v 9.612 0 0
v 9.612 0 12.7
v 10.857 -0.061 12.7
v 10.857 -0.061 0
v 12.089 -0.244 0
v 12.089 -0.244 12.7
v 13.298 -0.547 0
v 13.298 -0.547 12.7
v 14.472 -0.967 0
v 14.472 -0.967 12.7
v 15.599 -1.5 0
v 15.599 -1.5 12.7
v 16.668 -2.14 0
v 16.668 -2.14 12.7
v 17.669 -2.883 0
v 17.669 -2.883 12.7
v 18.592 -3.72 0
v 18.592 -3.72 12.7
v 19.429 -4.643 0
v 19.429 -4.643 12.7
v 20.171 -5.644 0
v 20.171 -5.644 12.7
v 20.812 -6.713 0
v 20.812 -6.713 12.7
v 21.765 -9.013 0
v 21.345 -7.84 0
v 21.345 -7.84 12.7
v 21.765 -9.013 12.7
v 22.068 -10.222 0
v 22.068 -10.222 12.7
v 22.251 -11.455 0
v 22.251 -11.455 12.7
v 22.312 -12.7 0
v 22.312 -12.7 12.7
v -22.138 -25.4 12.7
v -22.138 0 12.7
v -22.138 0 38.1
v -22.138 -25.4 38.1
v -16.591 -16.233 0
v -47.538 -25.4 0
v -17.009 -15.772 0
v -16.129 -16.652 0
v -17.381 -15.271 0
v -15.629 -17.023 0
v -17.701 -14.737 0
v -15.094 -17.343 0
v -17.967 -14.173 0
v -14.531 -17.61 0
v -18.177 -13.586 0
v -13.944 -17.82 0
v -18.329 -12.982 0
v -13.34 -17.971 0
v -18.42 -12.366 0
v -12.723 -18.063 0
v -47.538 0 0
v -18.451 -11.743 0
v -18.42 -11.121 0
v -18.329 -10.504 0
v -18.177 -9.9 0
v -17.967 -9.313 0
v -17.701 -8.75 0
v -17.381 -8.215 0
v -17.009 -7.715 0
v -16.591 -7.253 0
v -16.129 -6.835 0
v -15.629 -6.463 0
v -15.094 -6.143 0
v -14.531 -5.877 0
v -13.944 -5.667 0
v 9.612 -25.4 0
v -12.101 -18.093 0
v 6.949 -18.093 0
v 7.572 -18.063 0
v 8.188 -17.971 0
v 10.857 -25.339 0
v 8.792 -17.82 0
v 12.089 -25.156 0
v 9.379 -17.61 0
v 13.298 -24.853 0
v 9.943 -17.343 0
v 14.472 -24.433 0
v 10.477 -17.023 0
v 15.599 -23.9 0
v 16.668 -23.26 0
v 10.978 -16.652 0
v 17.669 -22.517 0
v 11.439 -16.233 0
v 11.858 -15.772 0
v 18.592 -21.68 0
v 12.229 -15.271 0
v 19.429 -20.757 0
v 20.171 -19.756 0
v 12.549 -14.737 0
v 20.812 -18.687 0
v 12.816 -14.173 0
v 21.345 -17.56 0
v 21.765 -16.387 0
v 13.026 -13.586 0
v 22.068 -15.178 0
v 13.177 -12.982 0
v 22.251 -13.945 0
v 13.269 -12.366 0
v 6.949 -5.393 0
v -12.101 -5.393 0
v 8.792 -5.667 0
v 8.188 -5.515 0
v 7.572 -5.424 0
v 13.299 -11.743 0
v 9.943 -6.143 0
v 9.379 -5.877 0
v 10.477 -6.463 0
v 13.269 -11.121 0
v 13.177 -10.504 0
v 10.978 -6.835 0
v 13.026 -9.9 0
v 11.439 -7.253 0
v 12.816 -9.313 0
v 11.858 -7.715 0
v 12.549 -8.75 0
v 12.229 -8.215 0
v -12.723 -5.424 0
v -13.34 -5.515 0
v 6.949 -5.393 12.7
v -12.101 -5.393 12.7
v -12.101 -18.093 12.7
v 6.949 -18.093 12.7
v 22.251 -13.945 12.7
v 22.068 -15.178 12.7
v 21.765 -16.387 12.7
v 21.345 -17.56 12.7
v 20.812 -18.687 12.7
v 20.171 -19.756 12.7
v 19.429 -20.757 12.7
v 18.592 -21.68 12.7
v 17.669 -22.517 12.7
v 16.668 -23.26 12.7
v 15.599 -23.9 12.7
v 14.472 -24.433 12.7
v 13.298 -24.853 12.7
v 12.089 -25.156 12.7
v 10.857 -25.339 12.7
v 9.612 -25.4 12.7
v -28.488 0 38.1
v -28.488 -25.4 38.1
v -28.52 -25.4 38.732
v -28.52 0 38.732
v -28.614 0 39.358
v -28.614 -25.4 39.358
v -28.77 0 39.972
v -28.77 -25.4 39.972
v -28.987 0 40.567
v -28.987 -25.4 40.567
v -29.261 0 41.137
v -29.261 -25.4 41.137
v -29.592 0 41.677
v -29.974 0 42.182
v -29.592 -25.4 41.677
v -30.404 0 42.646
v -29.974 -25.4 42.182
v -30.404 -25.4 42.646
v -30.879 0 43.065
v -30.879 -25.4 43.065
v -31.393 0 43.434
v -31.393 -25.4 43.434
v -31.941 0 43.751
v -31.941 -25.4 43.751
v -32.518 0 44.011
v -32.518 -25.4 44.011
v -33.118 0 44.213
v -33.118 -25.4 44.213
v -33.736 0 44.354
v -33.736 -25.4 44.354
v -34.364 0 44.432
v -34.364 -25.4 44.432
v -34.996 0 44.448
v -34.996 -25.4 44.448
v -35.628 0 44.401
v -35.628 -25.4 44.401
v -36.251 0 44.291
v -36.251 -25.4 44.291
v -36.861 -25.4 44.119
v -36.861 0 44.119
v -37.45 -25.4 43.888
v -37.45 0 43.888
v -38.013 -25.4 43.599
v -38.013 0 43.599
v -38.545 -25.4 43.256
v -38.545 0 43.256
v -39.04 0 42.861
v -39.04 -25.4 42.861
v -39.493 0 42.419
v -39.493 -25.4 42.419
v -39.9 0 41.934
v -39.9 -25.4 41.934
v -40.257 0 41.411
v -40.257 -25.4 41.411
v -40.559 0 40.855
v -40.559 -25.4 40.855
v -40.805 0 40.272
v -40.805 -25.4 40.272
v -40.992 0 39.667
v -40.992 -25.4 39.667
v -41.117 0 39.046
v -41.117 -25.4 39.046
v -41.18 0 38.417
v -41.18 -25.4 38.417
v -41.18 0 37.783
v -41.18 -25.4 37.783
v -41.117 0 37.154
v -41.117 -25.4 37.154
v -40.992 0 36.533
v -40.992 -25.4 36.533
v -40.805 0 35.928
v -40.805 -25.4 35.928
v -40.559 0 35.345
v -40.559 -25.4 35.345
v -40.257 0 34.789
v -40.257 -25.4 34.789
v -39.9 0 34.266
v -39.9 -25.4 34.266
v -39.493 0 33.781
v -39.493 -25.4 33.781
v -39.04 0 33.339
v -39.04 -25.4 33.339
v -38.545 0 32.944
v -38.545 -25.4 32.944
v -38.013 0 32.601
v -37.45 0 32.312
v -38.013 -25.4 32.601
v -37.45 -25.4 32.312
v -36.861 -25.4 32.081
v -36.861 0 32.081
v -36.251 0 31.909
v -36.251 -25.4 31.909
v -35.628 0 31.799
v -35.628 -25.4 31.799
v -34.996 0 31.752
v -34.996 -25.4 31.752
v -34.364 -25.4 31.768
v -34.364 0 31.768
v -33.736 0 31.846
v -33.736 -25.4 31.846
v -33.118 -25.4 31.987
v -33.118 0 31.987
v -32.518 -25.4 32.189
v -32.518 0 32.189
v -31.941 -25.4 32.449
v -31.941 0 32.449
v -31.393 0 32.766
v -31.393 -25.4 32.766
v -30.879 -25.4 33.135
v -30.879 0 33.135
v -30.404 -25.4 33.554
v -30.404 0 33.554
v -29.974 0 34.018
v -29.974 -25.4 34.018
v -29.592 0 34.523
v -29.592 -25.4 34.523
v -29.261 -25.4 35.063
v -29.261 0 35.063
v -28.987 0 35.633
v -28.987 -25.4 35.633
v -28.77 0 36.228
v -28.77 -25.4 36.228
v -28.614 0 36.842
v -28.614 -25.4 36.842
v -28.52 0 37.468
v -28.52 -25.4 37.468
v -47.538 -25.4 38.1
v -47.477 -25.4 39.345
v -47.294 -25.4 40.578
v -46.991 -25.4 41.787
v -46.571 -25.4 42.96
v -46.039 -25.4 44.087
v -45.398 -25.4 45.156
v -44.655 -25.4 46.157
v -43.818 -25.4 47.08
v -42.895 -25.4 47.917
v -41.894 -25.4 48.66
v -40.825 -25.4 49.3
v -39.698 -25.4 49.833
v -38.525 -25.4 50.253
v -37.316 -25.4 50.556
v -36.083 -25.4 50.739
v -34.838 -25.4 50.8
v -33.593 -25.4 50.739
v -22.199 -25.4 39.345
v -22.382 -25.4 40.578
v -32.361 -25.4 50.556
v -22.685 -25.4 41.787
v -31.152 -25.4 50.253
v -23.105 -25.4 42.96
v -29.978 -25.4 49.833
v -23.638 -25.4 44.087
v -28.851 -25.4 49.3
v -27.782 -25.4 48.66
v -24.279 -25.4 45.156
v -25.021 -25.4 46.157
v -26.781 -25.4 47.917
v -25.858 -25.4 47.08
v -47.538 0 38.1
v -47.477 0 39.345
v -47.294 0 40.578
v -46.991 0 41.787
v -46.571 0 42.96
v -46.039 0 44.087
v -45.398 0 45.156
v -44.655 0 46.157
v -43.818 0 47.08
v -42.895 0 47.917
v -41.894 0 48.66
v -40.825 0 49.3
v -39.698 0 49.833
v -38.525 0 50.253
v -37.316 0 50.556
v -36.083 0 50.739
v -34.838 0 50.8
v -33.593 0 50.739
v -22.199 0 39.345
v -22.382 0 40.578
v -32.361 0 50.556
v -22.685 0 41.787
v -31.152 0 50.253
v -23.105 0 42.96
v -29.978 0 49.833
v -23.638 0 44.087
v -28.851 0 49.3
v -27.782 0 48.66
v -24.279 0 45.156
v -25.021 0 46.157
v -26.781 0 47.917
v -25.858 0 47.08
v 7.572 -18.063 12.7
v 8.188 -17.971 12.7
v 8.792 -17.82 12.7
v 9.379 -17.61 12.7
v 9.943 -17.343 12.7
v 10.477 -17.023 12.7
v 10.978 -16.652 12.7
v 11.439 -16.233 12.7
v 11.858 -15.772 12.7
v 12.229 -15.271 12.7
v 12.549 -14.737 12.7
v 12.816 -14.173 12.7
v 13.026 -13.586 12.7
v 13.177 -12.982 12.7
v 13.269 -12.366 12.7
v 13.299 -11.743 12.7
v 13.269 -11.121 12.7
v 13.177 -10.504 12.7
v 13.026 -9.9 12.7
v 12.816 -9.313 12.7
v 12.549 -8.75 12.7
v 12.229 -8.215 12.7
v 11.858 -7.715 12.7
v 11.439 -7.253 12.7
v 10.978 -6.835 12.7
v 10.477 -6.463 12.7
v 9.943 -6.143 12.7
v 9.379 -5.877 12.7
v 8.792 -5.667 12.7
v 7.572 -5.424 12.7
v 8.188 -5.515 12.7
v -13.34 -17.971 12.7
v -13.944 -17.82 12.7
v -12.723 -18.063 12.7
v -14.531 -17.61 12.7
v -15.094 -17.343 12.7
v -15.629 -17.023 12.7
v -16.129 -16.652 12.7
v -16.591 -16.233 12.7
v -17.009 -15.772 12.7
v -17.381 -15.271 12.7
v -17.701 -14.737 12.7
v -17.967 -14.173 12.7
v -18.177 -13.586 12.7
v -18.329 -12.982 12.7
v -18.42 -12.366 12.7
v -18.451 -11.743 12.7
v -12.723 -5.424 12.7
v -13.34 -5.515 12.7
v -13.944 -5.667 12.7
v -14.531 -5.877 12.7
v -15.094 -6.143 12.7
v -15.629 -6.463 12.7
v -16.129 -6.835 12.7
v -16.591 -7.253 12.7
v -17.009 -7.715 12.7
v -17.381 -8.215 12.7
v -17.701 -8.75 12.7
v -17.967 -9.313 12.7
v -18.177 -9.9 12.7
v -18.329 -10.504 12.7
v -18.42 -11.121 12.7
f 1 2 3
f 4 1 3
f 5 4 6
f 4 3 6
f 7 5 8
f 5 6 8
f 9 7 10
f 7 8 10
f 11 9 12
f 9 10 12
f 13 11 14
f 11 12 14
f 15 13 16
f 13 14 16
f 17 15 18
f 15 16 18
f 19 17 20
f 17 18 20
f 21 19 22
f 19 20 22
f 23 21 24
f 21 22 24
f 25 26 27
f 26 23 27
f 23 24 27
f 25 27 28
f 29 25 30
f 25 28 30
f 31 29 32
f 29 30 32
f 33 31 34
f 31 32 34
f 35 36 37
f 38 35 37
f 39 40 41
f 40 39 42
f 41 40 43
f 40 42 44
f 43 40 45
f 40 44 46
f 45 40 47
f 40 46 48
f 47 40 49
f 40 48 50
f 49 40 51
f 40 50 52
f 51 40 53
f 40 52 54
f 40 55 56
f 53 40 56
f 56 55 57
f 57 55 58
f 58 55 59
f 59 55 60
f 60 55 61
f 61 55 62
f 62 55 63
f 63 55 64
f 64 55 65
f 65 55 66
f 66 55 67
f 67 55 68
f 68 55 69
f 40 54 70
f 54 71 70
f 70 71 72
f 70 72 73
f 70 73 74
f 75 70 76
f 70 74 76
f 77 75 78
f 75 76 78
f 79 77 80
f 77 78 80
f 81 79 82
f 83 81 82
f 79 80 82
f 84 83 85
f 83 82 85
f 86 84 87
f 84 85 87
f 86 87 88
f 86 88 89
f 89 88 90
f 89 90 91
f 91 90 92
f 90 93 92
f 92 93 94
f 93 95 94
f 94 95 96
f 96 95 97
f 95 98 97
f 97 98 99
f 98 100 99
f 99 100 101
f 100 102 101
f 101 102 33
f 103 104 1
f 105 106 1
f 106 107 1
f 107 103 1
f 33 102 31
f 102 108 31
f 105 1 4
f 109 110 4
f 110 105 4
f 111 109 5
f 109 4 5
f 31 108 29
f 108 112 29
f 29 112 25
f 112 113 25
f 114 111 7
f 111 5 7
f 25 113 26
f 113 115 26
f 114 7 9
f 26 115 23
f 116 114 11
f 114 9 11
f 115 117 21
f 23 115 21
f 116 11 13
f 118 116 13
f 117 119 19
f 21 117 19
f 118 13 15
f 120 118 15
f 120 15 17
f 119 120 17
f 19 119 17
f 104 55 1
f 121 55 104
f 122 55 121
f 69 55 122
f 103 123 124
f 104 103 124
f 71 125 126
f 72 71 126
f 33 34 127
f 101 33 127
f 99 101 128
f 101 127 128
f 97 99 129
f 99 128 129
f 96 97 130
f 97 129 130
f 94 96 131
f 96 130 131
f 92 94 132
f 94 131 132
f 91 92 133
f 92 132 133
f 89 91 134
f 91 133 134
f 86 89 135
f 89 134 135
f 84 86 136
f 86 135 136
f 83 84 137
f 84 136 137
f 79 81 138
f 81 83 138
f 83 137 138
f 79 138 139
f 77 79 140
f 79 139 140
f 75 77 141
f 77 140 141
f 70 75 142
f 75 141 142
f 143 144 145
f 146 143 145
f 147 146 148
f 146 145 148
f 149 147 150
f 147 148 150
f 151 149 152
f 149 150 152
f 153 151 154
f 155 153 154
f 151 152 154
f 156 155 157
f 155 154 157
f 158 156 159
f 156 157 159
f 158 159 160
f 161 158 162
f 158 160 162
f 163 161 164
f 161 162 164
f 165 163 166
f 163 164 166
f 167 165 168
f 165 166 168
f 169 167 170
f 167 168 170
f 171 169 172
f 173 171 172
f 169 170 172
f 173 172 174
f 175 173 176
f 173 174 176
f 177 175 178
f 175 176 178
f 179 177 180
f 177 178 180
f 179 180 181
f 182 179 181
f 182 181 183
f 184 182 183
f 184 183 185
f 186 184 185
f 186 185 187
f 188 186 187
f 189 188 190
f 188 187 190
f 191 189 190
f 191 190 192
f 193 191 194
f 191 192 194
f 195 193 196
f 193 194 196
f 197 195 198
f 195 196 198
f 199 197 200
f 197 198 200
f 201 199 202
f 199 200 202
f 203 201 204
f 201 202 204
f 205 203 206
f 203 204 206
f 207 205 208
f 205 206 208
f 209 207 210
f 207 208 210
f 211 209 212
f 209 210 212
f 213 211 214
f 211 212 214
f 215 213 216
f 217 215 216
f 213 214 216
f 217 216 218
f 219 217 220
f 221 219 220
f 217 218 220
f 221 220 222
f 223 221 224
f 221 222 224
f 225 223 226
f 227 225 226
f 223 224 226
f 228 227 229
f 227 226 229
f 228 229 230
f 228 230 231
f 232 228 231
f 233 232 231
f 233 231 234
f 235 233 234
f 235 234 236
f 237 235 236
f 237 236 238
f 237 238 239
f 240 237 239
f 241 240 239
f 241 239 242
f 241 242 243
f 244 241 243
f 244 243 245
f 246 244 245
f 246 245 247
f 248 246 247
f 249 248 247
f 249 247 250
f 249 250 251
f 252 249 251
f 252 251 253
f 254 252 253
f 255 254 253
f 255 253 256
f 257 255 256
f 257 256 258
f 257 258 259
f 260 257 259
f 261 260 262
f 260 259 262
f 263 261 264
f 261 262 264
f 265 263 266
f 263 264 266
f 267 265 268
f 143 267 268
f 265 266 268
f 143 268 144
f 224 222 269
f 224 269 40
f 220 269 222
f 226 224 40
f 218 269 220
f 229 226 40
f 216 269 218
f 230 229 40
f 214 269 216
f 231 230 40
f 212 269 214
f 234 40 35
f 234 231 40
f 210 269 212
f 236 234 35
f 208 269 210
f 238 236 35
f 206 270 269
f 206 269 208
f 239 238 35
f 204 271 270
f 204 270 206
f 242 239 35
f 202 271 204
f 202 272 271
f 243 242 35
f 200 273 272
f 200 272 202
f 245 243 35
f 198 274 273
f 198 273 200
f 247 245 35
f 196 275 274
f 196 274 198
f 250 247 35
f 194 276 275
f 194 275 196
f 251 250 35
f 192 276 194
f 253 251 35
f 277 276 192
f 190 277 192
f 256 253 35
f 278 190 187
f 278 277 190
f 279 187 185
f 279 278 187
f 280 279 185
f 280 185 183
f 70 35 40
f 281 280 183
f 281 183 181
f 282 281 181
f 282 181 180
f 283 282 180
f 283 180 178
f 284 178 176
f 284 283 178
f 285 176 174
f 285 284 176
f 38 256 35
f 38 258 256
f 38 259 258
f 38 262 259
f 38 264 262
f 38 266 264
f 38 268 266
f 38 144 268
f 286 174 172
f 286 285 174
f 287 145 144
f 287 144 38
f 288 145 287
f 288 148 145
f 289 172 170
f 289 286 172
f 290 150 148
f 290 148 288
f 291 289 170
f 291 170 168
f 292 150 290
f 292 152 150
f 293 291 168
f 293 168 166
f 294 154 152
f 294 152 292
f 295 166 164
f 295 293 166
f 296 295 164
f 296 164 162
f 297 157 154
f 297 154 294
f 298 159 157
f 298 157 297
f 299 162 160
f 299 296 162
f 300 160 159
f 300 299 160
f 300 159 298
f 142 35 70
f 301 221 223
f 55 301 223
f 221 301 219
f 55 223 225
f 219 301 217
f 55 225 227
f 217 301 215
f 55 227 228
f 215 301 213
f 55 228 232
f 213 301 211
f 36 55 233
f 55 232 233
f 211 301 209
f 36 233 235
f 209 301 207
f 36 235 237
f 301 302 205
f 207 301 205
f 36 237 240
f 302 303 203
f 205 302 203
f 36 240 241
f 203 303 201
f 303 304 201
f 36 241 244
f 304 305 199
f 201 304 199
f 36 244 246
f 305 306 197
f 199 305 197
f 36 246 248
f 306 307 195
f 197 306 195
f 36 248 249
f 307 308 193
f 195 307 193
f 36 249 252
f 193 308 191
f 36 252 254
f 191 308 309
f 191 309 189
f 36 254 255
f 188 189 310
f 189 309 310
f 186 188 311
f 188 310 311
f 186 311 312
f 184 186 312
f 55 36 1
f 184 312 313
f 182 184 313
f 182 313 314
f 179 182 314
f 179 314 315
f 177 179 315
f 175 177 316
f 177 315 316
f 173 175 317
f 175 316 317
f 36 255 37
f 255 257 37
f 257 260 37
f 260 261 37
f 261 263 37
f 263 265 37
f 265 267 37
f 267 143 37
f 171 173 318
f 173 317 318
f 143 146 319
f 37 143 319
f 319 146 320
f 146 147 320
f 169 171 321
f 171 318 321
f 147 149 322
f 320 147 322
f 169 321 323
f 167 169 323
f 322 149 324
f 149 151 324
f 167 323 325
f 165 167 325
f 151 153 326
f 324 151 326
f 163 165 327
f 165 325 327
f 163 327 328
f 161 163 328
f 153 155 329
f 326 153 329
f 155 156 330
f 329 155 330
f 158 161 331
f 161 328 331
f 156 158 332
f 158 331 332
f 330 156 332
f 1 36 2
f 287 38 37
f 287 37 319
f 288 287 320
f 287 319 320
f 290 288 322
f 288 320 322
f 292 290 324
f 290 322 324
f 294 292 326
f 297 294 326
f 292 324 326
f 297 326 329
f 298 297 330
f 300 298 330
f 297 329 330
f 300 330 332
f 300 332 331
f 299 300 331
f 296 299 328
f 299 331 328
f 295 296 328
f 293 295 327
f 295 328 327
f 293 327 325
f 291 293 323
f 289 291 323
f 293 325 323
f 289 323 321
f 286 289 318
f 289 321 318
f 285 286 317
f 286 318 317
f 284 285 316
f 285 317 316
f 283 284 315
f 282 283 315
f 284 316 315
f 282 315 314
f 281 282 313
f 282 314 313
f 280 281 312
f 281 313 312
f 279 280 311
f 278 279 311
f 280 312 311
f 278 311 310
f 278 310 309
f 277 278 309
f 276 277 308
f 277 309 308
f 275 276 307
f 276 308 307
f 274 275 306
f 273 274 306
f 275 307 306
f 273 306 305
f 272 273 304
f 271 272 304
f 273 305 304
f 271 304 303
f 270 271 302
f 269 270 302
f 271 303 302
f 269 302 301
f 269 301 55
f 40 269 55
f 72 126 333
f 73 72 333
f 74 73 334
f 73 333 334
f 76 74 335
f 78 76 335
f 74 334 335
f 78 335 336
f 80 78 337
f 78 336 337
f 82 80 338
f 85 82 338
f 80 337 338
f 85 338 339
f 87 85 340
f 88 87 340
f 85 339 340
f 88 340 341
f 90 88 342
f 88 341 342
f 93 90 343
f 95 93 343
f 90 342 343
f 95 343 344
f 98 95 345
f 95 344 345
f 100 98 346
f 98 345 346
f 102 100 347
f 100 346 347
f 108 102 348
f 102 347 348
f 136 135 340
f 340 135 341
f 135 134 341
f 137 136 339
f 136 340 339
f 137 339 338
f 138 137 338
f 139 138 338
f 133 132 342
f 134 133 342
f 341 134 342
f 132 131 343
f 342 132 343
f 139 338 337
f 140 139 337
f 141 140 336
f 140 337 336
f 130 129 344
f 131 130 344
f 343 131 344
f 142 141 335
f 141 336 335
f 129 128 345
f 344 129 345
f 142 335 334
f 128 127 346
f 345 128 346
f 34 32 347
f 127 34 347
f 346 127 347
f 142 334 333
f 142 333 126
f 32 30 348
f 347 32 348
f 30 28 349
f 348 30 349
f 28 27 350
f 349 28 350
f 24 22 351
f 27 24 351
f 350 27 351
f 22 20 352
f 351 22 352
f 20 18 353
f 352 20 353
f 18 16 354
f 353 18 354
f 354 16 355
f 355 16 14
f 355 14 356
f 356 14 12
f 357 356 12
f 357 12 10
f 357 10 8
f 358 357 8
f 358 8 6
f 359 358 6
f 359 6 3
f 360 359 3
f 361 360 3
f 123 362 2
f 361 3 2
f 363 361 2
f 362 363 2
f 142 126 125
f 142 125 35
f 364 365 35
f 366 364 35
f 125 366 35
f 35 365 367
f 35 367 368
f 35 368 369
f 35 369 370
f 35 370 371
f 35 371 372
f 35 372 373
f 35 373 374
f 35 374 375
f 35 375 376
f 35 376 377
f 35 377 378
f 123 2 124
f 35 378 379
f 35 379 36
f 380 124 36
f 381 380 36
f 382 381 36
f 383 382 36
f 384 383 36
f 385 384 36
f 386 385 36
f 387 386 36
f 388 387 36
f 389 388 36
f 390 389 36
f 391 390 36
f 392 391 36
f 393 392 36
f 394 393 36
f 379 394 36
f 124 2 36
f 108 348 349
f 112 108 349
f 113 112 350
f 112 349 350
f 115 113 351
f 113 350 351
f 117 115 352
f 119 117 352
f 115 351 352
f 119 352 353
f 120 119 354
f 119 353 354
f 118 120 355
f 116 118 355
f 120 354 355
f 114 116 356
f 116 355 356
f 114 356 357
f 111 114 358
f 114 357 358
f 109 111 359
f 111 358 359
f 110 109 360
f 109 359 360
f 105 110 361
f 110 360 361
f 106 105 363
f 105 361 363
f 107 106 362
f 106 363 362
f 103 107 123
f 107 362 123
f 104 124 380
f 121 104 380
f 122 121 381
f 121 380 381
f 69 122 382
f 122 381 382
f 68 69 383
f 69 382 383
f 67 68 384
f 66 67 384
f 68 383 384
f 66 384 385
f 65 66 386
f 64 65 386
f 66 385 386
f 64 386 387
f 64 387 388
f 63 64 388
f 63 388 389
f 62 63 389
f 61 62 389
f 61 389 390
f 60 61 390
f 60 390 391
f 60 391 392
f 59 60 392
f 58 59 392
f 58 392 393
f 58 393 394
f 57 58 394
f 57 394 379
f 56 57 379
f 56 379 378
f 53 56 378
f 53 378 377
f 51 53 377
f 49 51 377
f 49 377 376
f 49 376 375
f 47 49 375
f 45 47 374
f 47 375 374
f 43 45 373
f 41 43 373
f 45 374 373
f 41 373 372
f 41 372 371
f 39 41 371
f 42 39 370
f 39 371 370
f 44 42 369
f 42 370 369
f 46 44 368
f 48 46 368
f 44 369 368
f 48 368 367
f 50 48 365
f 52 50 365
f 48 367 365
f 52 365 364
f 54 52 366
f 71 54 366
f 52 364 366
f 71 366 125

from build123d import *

# Parameters (mm, degrees)
F1_DEPTH = 25.4
F2_R     = 6.35
F3_DEPTH = 25.4
F5_DEPTH = 25.4
F7_DEPTH = 12.701


with BuildPart() as f1:
    # F0 (on Front) → F1 (new body)
    with BuildSketch(Plane.XZ):
        with BuildLine():
            Line((-47.538182, 38.1), (-47.538182, 0))
            Line((-47.538182, 0), (22.311818, 0))
            Line((22.311818, 0), (22.311818, 12.7))
            Line((22.311818, 12.7), (-22.138182, 12.7))
            Line((-22.138182, 12.7), (-22.138182, 38.1))
            ThreePointArc((-22.138182, 38.1), (-34.838182, 50.8), (-47.538182, 38.1))
        make_face()
    extrude(amount=F1_DEPTH)

    # F2 (on face) → F3 (cut)
    with BuildSketch(Plane.XZ.offset(25.4)):
        with Locations((-34.838182, 38.1)):
            Circle(F2_R)
    extrude(amount=-F3_DEPTH, mode=Mode.SUBTRACT)

    # F4 (on face) → F5 (cut)
    with BuildSketch(Plane.XY.offset(12.7)):
        with BuildLine():
            ThreePointArc((9.611818, 0), (18.592074, -3.719744), (22.311818, -12.7))
            Line((22.311818, -12.7), (22.311818, 0))
            Line((22.311818, 0), (9.611818, 0))
        make_face()
        with BuildLine():
            ThreePointArc((22.311818, -12.7), (18.592074, -21.680256), (9.611818, -25.4))
            Line((9.611818, -25.4), (22.311818, -25.4))
            Line((22.311818, -25.4), (22.311818, -12.7))
        make_face()
    extrude(amount=-F5_DEPTH, mode=Mode.SUBTRACT)

    # F6 (on face) → F7 (cut, through all)
    with BuildSketch(Plane.XY.offset(12.7)):
        with BuildLine():
            ThreePointArc((-12.100862, -18.09319), (-7.610734, -16.233318), (-5.750862, -11.74319))
            ThreePointArc((-5.750862, -11.74319), (-7.610734, -7.253062), (-12.100862, -5.39319))
            Line((-12.100862, -5.39319), (-12.100862, -18.09319))
        make_face()
        with BuildLine():
            Line((-12.100862, -18.09319), (-12.100862, -5.39319))
            ThreePointArc((-12.100862, -5.39319), (-18.450862, -11.74319), (-12.100862, -18.09319))
        make_face()
        with BuildLine():
            ThreePointArc((-12.100862, -5.39319), (-7.610734, -7.253062), (-5.750862, -11.74319))
            ThreePointArc((-5.750862, -11.74319), (-7.610734, -16.233318), (-12.100862, -18.09319))
            Line((-12.100862, -18.09319), (6.949138, -18.09319))
            ThreePointArc((6.949138, -18.09319), (0.599138, -11.74319), (6.949138, -5.39319))
            Line((6.949138, -5.39319), (-12.100862, -5.39319))
        make_face()
        with BuildLine():
            Line((6.949138, -18.09319), (6.949138, -5.39319))
            ThreePointArc((6.949138, -5.39319), (0.599138, -11.74319), (6.949138, -18.09319))
        make_face()
        with BuildLine():
            ThreePointArc((13.299138, -11.74319), (11.439266, -7.253062), (6.949138, -5.39319))
            Line((6.949138, -5.39319), (6.949138, -18.09319))
            ThreePointArc((6.949138, -18.09319), (11.439266, -16.233318), (13.299138, -11.74319))
        make_face()
    extrude(amount=-F7_DEPTH, mode=Mode.SUBTRACT)


solid = f1.part
